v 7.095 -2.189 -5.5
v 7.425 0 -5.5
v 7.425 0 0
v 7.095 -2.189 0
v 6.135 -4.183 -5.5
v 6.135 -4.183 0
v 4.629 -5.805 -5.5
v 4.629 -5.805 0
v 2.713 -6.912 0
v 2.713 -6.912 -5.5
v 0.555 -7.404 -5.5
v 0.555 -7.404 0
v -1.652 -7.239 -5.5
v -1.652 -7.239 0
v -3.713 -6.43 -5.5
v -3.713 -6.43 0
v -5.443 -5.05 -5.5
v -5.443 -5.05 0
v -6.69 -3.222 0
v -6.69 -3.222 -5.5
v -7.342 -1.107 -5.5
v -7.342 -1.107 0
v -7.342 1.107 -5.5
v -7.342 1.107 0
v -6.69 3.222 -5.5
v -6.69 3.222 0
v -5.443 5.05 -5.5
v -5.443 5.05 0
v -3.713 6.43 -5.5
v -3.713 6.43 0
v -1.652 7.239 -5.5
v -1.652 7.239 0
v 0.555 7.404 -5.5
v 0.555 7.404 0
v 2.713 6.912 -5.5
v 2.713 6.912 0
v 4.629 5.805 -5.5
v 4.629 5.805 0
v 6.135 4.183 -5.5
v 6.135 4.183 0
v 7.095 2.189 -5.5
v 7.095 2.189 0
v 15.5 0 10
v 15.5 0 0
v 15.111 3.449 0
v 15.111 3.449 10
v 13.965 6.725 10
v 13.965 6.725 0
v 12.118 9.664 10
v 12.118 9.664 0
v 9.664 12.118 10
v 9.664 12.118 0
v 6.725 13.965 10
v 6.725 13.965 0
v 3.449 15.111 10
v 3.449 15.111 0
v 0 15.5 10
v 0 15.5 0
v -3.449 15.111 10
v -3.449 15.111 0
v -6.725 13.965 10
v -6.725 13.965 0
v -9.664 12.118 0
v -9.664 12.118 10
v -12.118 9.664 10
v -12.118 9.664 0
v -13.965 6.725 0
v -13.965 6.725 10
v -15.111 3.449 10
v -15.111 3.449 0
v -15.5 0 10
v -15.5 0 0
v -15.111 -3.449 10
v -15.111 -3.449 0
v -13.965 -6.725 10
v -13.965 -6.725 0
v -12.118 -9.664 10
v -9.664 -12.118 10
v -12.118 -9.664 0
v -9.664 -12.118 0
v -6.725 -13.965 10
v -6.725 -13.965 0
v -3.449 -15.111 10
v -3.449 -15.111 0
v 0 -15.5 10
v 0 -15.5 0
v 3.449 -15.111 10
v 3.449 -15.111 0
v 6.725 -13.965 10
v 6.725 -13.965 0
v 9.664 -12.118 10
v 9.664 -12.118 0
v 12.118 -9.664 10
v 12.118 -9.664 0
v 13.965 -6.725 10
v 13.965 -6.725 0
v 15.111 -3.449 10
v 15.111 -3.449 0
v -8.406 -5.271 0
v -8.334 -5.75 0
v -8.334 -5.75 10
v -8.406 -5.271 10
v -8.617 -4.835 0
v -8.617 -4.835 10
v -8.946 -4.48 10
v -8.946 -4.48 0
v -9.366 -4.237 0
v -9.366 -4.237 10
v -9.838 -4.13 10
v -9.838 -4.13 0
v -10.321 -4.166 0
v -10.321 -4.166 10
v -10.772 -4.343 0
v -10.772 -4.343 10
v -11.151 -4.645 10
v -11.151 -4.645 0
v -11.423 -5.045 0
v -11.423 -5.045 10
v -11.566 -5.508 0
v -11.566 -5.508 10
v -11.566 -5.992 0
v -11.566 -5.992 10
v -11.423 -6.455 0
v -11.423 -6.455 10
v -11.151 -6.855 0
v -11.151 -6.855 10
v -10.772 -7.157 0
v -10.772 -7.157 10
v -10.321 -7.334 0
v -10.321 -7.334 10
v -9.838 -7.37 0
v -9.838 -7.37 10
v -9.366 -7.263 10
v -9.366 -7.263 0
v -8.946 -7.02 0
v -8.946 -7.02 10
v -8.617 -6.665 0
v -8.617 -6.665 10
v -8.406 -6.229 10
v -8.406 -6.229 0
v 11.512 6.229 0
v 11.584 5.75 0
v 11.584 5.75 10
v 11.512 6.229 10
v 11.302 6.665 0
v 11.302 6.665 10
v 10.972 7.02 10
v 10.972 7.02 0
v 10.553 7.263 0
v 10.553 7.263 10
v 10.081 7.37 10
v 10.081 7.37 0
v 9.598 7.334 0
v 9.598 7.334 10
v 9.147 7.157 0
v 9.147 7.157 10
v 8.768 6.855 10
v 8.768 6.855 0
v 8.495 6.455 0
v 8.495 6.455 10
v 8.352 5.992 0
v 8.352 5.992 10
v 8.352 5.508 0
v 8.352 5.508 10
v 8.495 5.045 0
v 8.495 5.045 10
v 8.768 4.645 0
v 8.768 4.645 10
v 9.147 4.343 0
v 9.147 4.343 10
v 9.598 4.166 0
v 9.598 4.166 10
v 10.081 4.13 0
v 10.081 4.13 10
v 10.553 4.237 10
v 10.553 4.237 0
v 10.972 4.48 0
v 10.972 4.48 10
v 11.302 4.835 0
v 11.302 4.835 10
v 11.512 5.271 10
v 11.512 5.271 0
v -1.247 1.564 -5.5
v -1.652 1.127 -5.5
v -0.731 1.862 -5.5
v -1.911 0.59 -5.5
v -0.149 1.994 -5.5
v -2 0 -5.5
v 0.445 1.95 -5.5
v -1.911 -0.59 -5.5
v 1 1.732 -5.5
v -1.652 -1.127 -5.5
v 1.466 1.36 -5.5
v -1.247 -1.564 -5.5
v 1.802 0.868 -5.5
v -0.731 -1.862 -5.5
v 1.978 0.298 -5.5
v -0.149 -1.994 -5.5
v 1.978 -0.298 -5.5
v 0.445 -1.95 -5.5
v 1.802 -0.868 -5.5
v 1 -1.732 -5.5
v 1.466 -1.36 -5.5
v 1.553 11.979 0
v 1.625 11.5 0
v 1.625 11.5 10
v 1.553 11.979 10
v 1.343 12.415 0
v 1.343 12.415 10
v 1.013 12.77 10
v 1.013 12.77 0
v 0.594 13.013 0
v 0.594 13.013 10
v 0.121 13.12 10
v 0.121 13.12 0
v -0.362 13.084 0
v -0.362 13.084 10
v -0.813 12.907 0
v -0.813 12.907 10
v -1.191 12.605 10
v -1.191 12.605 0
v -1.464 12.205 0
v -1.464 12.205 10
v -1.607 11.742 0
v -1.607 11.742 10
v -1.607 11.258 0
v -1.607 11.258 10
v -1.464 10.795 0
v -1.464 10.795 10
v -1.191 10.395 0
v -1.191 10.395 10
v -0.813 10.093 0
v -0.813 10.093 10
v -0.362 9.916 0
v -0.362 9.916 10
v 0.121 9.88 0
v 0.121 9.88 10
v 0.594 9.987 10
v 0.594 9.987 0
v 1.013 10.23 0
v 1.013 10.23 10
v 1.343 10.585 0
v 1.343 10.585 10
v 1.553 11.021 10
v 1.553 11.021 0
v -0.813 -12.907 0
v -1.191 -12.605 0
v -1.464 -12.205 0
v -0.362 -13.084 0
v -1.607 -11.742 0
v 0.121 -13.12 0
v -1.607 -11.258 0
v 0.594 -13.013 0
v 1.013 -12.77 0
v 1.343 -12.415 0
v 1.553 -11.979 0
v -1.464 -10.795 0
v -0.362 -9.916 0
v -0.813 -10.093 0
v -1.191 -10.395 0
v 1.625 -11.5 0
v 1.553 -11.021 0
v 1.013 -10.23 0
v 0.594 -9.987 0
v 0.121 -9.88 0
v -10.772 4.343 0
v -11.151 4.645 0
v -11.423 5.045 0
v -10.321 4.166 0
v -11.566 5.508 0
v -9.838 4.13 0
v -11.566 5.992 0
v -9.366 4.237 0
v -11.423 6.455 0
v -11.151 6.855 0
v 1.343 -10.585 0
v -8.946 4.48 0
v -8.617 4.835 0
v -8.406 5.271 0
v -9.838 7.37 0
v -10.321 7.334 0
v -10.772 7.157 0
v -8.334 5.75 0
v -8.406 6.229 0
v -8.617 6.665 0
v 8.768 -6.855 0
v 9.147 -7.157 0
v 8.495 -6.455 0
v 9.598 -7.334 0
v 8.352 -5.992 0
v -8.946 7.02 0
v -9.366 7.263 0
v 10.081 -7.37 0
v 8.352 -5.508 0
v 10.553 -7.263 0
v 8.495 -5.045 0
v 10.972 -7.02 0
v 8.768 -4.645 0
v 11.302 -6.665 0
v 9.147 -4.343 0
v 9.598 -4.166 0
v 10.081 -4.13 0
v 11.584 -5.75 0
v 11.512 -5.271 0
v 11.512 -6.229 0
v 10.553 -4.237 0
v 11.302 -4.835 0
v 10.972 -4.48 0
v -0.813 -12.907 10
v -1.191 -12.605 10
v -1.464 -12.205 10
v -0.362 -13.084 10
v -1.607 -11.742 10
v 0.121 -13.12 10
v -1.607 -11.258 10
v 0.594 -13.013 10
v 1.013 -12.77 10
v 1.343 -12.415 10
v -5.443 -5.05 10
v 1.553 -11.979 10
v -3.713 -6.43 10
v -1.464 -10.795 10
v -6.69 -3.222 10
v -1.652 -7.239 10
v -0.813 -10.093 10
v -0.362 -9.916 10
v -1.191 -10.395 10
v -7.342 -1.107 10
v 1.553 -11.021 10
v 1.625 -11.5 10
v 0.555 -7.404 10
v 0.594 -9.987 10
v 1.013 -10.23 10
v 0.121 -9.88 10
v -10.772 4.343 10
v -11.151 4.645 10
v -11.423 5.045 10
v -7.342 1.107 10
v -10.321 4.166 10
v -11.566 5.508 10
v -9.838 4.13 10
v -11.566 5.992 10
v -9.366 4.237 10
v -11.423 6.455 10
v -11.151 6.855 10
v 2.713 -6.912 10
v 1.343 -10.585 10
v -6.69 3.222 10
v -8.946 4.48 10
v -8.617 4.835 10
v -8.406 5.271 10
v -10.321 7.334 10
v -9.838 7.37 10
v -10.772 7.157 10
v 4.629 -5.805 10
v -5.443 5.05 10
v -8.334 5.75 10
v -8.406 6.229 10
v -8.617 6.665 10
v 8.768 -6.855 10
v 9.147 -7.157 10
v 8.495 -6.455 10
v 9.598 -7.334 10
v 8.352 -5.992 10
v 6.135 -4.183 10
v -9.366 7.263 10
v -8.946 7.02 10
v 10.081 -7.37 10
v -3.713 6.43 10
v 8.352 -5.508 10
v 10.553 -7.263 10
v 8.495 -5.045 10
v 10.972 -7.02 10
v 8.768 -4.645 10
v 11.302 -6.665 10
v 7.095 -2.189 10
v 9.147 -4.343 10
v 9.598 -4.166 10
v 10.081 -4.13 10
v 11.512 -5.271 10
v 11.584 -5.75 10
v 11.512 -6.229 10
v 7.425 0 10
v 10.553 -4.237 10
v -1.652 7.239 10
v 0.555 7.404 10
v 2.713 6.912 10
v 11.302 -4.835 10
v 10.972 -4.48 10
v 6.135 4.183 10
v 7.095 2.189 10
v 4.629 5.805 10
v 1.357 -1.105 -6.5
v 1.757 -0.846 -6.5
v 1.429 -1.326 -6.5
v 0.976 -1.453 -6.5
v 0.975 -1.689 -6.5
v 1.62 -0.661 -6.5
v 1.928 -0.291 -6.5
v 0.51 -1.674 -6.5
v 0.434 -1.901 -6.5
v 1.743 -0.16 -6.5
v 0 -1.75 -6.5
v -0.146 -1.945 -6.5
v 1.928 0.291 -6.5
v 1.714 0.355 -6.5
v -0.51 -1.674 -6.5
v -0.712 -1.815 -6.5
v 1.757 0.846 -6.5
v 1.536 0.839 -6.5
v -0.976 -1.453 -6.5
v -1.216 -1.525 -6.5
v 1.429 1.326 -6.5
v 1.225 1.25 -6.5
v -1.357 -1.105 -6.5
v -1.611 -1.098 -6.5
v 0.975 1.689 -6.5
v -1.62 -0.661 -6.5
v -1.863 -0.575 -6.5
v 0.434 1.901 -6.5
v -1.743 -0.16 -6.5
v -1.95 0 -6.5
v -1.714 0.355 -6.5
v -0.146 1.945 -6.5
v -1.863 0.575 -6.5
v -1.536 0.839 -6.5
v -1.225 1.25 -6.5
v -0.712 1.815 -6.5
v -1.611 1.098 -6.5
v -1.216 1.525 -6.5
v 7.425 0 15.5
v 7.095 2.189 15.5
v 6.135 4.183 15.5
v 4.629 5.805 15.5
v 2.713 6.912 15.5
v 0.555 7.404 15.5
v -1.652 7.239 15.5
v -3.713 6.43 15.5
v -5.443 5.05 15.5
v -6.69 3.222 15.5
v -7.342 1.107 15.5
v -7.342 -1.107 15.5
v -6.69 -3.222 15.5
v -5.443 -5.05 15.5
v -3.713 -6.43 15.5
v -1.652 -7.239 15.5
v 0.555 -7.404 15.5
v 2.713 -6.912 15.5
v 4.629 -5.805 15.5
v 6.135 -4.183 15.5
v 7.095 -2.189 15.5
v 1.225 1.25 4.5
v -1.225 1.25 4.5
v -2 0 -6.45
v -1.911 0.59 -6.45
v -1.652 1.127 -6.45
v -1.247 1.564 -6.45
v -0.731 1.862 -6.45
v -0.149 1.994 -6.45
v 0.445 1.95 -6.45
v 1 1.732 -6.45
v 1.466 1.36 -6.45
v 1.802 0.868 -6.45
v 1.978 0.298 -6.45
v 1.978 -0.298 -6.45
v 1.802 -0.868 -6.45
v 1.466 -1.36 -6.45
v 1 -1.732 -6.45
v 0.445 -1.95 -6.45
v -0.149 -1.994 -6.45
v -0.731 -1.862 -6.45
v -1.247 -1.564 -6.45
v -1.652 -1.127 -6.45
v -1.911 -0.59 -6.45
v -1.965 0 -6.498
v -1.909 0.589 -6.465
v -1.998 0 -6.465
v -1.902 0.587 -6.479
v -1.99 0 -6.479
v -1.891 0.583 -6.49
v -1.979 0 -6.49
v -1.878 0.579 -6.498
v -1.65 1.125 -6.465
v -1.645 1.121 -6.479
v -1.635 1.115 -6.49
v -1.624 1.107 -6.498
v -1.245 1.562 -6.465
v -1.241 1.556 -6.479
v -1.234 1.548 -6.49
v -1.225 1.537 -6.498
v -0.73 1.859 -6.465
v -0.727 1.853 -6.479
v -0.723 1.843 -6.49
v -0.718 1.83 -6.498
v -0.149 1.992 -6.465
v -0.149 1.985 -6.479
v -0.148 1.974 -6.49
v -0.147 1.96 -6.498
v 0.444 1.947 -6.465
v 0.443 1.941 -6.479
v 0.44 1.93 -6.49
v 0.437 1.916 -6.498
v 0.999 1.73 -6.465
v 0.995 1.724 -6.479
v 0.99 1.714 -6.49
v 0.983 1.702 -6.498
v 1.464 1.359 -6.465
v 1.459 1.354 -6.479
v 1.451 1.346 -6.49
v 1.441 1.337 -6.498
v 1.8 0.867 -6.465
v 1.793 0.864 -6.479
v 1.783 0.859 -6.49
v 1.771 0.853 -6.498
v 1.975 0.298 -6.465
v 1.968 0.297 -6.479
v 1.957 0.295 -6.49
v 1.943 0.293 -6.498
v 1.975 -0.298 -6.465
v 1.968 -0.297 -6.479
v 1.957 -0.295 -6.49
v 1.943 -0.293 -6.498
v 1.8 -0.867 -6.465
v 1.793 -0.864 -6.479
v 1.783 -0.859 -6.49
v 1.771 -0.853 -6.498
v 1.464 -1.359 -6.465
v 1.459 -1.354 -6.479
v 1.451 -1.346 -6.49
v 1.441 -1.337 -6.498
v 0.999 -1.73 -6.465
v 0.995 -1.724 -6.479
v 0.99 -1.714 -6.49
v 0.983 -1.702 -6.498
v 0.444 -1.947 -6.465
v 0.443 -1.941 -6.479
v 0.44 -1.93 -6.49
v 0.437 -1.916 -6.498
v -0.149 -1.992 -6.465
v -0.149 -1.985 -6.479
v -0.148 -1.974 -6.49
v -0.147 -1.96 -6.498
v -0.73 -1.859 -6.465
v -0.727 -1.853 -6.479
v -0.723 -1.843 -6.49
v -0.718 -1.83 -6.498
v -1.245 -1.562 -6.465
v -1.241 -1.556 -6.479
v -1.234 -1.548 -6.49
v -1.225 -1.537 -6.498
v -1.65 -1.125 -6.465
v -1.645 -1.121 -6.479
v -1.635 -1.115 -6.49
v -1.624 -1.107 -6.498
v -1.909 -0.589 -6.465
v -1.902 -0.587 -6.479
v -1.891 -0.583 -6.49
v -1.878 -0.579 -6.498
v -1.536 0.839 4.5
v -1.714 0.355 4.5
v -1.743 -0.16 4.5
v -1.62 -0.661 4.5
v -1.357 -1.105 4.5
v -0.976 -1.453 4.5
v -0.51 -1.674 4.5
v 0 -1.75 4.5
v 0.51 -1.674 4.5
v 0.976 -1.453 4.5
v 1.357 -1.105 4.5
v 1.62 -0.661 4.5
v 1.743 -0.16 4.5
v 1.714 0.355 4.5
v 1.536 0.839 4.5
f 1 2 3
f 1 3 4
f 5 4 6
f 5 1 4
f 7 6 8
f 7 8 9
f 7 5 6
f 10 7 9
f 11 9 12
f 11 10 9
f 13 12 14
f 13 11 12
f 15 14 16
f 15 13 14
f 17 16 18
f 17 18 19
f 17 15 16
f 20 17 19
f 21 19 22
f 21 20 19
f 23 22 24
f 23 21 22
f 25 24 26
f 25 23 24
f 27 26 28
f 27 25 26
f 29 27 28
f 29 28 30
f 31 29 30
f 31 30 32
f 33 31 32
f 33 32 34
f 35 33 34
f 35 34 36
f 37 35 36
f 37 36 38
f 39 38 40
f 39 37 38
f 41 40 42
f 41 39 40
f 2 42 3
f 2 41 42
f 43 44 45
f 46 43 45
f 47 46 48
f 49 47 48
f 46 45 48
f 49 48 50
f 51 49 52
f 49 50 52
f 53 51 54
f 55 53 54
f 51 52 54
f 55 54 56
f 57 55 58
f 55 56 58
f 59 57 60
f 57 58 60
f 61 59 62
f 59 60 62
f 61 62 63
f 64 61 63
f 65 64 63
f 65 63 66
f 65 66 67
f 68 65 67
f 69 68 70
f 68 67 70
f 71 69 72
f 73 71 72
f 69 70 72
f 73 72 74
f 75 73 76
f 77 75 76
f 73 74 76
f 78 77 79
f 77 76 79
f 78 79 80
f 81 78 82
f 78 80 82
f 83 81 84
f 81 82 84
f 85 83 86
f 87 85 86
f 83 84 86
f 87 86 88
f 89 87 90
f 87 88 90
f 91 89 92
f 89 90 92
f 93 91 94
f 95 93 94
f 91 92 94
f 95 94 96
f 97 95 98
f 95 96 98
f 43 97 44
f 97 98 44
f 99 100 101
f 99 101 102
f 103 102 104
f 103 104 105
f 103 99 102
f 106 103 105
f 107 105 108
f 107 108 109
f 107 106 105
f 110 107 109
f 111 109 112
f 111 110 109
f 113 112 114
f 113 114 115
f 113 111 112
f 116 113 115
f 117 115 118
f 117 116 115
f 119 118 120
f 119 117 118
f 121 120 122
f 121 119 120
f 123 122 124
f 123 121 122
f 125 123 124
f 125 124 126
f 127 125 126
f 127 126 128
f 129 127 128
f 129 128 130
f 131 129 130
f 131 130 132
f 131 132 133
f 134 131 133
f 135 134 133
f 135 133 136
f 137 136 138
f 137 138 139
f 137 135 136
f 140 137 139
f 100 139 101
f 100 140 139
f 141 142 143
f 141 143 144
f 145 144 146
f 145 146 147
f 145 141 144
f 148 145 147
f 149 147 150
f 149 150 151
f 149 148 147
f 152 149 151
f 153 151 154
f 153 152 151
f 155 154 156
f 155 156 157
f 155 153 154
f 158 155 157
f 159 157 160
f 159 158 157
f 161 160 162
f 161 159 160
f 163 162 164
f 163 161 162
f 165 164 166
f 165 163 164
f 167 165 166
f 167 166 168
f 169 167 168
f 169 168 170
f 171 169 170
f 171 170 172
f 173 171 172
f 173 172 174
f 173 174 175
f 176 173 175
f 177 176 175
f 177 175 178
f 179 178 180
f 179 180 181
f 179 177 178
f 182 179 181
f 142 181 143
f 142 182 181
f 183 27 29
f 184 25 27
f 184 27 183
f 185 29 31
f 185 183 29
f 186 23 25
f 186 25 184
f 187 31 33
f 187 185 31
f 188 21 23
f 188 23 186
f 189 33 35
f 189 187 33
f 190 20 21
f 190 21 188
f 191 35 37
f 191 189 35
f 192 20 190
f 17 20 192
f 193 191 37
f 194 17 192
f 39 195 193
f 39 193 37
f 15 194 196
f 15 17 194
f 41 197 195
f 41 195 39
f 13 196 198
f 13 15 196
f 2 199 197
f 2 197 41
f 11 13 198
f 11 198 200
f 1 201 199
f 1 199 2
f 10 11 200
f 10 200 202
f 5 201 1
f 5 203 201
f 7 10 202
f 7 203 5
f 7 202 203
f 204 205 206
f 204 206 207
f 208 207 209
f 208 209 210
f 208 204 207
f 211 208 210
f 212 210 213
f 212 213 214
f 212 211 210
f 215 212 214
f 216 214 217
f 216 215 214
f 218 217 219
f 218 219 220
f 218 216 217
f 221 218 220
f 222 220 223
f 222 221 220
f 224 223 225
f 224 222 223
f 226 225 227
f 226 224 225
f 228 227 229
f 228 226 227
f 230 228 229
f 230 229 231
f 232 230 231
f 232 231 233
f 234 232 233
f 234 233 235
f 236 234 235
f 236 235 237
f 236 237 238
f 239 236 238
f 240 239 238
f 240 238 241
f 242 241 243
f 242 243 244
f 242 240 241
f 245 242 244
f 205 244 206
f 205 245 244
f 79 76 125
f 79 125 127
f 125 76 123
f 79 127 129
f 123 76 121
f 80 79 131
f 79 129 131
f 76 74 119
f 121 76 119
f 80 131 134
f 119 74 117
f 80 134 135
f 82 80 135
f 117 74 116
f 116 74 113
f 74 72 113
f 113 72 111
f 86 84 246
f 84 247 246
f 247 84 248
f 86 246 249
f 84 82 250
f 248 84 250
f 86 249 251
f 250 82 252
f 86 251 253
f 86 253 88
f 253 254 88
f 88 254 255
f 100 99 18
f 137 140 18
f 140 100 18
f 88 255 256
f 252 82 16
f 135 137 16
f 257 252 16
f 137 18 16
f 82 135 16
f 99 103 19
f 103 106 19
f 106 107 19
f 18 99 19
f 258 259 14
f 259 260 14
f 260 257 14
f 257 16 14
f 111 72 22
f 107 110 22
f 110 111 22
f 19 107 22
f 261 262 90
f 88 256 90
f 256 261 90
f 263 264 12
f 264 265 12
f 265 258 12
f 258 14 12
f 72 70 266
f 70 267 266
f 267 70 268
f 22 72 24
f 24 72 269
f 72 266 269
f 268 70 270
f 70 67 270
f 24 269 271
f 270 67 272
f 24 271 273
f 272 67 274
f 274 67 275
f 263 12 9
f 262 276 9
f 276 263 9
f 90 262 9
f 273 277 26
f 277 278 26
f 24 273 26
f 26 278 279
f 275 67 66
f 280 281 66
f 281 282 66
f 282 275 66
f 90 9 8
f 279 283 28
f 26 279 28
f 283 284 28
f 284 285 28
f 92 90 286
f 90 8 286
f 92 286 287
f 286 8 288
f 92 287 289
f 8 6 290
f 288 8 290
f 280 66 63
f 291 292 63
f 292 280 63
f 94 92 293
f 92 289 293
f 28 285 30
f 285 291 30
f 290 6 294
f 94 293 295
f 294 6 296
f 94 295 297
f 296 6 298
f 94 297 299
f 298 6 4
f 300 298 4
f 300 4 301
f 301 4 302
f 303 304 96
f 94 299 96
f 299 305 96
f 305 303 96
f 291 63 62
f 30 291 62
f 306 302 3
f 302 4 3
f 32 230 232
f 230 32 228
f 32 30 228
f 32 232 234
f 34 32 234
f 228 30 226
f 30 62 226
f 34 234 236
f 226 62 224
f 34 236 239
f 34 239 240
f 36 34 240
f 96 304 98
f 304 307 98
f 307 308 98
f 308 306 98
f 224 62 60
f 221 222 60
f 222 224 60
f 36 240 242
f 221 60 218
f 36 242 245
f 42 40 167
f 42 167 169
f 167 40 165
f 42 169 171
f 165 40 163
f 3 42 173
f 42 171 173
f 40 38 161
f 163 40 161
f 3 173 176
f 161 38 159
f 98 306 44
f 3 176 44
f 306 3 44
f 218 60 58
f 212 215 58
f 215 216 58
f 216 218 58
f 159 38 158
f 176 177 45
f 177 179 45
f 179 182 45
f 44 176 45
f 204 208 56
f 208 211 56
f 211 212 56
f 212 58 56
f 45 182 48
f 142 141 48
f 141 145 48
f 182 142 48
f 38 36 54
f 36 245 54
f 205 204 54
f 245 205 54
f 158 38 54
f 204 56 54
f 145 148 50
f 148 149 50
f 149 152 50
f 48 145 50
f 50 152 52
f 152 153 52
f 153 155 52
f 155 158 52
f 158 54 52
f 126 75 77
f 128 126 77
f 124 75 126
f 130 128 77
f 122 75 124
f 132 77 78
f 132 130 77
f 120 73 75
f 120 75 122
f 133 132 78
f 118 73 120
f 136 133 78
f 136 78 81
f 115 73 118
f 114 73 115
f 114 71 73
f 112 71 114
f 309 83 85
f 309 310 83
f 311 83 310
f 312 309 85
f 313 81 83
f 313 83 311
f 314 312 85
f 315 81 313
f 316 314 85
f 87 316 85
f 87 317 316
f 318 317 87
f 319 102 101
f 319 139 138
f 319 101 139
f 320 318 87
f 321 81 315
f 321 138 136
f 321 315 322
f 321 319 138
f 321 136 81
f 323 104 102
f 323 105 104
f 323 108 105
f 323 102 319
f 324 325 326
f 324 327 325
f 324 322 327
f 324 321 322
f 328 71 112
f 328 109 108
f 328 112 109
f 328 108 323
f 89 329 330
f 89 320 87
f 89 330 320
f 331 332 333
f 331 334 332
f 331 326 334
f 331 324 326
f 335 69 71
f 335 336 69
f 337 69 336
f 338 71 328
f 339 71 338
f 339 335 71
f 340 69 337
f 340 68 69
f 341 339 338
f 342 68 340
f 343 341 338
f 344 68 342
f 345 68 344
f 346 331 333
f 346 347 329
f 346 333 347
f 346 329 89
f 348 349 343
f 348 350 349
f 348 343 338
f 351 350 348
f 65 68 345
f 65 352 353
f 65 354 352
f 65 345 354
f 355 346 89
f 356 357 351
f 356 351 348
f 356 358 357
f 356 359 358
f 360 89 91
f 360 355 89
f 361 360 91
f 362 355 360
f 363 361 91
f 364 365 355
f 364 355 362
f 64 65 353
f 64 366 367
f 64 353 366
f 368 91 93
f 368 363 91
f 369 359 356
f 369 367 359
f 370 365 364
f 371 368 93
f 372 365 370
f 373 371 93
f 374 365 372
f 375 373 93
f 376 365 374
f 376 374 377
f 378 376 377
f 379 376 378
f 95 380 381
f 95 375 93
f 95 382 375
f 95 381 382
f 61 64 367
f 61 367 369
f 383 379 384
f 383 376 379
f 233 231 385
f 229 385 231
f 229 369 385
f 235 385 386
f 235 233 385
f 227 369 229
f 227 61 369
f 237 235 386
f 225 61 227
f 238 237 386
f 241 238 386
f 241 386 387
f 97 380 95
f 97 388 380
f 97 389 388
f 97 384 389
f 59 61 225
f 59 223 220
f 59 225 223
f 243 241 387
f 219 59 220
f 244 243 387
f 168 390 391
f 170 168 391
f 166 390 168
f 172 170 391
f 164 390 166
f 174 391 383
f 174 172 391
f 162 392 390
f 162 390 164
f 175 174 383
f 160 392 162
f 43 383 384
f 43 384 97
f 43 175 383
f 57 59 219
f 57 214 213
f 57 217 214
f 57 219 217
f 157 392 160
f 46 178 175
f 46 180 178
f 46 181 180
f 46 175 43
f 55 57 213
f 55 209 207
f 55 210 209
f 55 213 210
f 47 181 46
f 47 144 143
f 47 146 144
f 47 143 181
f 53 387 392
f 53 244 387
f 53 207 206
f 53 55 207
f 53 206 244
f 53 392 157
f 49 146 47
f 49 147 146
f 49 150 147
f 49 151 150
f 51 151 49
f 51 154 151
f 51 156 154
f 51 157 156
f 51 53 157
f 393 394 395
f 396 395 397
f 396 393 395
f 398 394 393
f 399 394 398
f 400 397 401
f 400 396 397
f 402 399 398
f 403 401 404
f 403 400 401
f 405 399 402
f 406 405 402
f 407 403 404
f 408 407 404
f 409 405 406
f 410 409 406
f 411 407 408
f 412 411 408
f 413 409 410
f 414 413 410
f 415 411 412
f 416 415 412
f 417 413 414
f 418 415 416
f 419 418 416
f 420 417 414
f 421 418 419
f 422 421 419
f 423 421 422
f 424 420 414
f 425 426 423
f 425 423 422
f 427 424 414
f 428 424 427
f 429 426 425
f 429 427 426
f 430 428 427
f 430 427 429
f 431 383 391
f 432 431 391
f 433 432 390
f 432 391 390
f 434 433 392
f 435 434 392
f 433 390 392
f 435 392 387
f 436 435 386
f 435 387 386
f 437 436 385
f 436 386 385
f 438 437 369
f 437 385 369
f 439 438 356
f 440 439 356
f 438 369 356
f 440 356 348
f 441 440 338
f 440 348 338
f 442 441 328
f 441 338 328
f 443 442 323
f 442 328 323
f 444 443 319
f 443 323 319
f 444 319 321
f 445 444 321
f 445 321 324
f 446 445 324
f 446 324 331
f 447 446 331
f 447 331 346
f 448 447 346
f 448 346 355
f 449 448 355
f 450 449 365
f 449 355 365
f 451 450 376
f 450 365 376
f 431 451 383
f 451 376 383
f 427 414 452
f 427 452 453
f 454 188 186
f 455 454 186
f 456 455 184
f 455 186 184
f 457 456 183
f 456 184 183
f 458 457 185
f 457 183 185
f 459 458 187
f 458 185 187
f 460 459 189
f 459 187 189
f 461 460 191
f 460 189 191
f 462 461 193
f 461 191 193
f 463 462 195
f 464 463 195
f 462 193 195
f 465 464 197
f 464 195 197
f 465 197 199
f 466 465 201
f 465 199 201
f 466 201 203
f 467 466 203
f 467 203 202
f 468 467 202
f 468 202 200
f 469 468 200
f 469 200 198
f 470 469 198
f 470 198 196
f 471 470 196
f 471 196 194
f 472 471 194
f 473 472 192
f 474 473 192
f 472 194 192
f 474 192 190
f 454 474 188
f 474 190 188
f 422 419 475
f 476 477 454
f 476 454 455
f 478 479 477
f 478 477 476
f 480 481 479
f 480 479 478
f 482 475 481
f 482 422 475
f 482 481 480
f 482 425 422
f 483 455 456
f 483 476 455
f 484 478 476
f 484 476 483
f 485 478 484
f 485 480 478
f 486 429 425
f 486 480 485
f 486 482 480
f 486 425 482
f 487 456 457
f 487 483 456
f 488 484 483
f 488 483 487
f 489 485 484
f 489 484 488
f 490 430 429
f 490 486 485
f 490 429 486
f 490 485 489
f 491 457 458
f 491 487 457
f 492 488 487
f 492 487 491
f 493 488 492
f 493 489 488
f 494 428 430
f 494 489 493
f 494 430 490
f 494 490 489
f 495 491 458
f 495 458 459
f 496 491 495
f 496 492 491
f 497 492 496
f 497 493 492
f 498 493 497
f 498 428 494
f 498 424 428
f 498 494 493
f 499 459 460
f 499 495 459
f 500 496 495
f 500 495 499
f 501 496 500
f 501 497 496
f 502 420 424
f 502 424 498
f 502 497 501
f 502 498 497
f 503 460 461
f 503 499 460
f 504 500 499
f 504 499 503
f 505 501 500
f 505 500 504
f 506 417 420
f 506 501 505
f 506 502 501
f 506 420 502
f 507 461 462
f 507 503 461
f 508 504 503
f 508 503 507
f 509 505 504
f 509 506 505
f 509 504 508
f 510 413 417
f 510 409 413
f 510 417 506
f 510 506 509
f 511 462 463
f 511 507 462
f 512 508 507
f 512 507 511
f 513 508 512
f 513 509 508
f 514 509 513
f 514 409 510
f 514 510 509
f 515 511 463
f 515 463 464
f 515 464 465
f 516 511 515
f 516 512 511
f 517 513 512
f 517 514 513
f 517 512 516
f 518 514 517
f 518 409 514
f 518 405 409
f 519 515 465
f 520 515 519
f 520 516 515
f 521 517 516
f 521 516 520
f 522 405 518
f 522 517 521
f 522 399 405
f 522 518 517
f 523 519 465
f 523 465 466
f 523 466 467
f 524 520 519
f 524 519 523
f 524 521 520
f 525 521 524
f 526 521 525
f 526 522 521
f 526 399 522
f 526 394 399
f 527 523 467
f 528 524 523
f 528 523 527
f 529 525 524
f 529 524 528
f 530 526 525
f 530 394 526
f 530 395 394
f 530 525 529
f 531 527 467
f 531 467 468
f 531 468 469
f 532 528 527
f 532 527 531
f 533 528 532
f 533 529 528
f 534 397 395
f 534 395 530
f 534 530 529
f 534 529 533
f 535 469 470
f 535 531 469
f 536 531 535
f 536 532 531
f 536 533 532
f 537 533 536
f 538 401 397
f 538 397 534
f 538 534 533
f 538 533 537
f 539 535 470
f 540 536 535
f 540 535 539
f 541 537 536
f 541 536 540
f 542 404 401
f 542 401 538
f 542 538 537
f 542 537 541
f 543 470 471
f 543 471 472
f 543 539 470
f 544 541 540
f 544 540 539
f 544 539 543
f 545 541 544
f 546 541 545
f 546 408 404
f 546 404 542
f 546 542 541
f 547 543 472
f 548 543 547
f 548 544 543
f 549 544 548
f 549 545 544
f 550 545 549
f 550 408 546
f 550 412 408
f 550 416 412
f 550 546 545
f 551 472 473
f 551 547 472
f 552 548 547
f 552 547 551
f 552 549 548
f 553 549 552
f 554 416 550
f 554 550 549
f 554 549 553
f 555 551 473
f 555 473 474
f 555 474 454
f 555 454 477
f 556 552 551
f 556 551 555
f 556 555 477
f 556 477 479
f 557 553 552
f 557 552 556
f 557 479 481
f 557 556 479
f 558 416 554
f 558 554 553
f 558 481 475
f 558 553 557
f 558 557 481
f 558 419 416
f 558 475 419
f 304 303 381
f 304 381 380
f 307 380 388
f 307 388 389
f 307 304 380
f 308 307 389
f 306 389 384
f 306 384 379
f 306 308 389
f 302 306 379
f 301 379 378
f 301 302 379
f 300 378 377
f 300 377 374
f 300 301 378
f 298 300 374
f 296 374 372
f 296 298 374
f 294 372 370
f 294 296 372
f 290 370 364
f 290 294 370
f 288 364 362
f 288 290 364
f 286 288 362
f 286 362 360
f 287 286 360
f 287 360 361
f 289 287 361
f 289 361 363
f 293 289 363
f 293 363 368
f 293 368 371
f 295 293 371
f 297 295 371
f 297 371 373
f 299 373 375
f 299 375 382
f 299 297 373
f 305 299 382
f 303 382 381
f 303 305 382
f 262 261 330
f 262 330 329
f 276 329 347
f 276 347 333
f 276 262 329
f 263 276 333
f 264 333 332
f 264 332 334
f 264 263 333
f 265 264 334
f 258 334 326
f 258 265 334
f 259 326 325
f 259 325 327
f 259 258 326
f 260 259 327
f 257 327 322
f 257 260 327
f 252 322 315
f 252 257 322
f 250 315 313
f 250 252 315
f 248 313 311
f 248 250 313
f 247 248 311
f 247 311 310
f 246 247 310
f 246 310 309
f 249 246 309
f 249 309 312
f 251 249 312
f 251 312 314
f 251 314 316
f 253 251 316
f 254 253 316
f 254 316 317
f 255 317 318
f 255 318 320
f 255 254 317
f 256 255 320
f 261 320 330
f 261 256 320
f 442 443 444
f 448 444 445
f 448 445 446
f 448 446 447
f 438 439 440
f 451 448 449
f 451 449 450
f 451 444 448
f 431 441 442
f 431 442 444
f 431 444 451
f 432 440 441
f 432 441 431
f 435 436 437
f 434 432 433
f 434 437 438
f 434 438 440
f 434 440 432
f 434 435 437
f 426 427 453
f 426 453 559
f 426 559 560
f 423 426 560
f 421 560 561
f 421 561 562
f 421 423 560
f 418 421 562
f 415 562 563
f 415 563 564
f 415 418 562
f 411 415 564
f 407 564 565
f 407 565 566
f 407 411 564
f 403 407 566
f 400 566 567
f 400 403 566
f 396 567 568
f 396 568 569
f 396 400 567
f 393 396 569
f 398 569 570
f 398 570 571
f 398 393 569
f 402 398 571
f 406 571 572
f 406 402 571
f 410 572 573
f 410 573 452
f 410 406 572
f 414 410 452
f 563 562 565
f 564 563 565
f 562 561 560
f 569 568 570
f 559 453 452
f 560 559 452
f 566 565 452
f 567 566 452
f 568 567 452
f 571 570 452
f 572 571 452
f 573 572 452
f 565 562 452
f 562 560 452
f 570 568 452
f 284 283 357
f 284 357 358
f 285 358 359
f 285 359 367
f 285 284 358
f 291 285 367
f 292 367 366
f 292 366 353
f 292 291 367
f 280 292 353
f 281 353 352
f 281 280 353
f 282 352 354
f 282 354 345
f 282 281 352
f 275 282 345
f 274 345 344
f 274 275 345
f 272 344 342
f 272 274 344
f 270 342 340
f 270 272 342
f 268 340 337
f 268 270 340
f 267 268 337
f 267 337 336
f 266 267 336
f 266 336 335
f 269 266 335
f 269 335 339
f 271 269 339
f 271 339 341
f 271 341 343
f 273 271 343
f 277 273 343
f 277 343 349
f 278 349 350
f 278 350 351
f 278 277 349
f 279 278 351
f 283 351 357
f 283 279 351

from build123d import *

# Parameters (mm, degrees)
SKETCH2_R           = 15.5
SKETCH2_R_2         = 1.625
BOSS_EXTRUDE1_DEPTH = 10
SKETCH3_R           = 7.425
BOSS_EXTRUDE2_DEPTH = 5.5
BOSS_EXTRUDE4_START = 5.5
SKETCH6_R           = 7.425
BOSS_EXTRUDE4_DEPTH = 5.5
SKETCH7_R           = 2
BOSS_EXTRUDE5_DEPTH = 1
FILLET2_R           = 0.05
CUT_EXTRUDE1_DEPTH  = 11


with BuildPart() as part:
    # Sketch2 → Boss-Extrude1 (new body)
    with BuildSketch(Plane.XY):
        Circle(SKETCH2_R)
        with Locations((0, 11.5)):
            Circle(SKETCH2_R_2, mode=Mode.SUBTRACT)
        with Locations((9.959292144, 5.75)):
            Circle(SKETCH2_R_2, mode=Mode.SUBTRACT)
        with Locations((9.959292144, -5.75)):
            Circle(SKETCH2_R_2, mode=Mode.SUBTRACT)
        with Locations((0, -11.5)):
            Circle(SKETCH2_R_2, mode=Mode.SUBTRACT)
        with Locations((-9.959292144, -5.75)):
            Circle(SKETCH2_R_2, mode=Mode.SUBTRACT)
        with Locations((-9.959292144, 5.75)):
            Circle(SKETCH2_R_2, mode=Mode.SUBTRACT)
    extrude(amount=BOSS_EXTRUDE1_DEPTH)

    # Sketch3 → Boss-Extrude2 (add)
    with BuildSketch(Plane.XY.offset(10)):
        Circle(SKETCH3_R)
    extrude(amount=BOSS_EXTRUDE2_DEPTH)

    # Sketch6 → Boss-Extrude4 (add)
    with BuildSketch(Plane(origin=(0, 0, 0), x_dir=(-1, 0, 0), z_dir=(0, 0, -1)).offset(BOSS_EXTRUDE4_START)):
        with Locations(Location((0, 0, 0), (0, 0, 180))):
            Circle(SKETCH6_R)
    extrude(amount=-BOSS_EXTRUDE4_DEPTH)

    # Sketch7 → Boss-Extrude5 (add)
    with BuildSketch(Plane(origin=(0, 0, -5.5), x_dir=(-1, 0, 0), z_dir=(0, 0, -1))):
        Circle(SKETCH7_R)
    extrude(amount=BOSS_EXTRUDE5_DEPTH)

    # Fillet2
    fillet2_edges = [part.edges().sort_by_distance(p)[0] for p in [
        (2, 0, -6.5),
    ]]
    fillet(fillet2_edges, radius=FILLET2_R)

    # Sketch9 → Cut-Extrude1 (cut)
    with BuildSketch(Plane(origin=(0, 0, -6.5), x_dir=(-1, 0, 0), z_dir=(0, 0, -1))):
        with BuildLine():
            Line((-1.224744871, 1.25), (1.224744871, 1.25))
            ThreePointArc((1.224744871, 1.25), (0, -1.75), (-1.224744871, 1.25))
        make_face()
    extrude(amount=-CUT_EXTRUDE1_DEPTH, mode=Mode.SUBTRACT)


solid = part.part
